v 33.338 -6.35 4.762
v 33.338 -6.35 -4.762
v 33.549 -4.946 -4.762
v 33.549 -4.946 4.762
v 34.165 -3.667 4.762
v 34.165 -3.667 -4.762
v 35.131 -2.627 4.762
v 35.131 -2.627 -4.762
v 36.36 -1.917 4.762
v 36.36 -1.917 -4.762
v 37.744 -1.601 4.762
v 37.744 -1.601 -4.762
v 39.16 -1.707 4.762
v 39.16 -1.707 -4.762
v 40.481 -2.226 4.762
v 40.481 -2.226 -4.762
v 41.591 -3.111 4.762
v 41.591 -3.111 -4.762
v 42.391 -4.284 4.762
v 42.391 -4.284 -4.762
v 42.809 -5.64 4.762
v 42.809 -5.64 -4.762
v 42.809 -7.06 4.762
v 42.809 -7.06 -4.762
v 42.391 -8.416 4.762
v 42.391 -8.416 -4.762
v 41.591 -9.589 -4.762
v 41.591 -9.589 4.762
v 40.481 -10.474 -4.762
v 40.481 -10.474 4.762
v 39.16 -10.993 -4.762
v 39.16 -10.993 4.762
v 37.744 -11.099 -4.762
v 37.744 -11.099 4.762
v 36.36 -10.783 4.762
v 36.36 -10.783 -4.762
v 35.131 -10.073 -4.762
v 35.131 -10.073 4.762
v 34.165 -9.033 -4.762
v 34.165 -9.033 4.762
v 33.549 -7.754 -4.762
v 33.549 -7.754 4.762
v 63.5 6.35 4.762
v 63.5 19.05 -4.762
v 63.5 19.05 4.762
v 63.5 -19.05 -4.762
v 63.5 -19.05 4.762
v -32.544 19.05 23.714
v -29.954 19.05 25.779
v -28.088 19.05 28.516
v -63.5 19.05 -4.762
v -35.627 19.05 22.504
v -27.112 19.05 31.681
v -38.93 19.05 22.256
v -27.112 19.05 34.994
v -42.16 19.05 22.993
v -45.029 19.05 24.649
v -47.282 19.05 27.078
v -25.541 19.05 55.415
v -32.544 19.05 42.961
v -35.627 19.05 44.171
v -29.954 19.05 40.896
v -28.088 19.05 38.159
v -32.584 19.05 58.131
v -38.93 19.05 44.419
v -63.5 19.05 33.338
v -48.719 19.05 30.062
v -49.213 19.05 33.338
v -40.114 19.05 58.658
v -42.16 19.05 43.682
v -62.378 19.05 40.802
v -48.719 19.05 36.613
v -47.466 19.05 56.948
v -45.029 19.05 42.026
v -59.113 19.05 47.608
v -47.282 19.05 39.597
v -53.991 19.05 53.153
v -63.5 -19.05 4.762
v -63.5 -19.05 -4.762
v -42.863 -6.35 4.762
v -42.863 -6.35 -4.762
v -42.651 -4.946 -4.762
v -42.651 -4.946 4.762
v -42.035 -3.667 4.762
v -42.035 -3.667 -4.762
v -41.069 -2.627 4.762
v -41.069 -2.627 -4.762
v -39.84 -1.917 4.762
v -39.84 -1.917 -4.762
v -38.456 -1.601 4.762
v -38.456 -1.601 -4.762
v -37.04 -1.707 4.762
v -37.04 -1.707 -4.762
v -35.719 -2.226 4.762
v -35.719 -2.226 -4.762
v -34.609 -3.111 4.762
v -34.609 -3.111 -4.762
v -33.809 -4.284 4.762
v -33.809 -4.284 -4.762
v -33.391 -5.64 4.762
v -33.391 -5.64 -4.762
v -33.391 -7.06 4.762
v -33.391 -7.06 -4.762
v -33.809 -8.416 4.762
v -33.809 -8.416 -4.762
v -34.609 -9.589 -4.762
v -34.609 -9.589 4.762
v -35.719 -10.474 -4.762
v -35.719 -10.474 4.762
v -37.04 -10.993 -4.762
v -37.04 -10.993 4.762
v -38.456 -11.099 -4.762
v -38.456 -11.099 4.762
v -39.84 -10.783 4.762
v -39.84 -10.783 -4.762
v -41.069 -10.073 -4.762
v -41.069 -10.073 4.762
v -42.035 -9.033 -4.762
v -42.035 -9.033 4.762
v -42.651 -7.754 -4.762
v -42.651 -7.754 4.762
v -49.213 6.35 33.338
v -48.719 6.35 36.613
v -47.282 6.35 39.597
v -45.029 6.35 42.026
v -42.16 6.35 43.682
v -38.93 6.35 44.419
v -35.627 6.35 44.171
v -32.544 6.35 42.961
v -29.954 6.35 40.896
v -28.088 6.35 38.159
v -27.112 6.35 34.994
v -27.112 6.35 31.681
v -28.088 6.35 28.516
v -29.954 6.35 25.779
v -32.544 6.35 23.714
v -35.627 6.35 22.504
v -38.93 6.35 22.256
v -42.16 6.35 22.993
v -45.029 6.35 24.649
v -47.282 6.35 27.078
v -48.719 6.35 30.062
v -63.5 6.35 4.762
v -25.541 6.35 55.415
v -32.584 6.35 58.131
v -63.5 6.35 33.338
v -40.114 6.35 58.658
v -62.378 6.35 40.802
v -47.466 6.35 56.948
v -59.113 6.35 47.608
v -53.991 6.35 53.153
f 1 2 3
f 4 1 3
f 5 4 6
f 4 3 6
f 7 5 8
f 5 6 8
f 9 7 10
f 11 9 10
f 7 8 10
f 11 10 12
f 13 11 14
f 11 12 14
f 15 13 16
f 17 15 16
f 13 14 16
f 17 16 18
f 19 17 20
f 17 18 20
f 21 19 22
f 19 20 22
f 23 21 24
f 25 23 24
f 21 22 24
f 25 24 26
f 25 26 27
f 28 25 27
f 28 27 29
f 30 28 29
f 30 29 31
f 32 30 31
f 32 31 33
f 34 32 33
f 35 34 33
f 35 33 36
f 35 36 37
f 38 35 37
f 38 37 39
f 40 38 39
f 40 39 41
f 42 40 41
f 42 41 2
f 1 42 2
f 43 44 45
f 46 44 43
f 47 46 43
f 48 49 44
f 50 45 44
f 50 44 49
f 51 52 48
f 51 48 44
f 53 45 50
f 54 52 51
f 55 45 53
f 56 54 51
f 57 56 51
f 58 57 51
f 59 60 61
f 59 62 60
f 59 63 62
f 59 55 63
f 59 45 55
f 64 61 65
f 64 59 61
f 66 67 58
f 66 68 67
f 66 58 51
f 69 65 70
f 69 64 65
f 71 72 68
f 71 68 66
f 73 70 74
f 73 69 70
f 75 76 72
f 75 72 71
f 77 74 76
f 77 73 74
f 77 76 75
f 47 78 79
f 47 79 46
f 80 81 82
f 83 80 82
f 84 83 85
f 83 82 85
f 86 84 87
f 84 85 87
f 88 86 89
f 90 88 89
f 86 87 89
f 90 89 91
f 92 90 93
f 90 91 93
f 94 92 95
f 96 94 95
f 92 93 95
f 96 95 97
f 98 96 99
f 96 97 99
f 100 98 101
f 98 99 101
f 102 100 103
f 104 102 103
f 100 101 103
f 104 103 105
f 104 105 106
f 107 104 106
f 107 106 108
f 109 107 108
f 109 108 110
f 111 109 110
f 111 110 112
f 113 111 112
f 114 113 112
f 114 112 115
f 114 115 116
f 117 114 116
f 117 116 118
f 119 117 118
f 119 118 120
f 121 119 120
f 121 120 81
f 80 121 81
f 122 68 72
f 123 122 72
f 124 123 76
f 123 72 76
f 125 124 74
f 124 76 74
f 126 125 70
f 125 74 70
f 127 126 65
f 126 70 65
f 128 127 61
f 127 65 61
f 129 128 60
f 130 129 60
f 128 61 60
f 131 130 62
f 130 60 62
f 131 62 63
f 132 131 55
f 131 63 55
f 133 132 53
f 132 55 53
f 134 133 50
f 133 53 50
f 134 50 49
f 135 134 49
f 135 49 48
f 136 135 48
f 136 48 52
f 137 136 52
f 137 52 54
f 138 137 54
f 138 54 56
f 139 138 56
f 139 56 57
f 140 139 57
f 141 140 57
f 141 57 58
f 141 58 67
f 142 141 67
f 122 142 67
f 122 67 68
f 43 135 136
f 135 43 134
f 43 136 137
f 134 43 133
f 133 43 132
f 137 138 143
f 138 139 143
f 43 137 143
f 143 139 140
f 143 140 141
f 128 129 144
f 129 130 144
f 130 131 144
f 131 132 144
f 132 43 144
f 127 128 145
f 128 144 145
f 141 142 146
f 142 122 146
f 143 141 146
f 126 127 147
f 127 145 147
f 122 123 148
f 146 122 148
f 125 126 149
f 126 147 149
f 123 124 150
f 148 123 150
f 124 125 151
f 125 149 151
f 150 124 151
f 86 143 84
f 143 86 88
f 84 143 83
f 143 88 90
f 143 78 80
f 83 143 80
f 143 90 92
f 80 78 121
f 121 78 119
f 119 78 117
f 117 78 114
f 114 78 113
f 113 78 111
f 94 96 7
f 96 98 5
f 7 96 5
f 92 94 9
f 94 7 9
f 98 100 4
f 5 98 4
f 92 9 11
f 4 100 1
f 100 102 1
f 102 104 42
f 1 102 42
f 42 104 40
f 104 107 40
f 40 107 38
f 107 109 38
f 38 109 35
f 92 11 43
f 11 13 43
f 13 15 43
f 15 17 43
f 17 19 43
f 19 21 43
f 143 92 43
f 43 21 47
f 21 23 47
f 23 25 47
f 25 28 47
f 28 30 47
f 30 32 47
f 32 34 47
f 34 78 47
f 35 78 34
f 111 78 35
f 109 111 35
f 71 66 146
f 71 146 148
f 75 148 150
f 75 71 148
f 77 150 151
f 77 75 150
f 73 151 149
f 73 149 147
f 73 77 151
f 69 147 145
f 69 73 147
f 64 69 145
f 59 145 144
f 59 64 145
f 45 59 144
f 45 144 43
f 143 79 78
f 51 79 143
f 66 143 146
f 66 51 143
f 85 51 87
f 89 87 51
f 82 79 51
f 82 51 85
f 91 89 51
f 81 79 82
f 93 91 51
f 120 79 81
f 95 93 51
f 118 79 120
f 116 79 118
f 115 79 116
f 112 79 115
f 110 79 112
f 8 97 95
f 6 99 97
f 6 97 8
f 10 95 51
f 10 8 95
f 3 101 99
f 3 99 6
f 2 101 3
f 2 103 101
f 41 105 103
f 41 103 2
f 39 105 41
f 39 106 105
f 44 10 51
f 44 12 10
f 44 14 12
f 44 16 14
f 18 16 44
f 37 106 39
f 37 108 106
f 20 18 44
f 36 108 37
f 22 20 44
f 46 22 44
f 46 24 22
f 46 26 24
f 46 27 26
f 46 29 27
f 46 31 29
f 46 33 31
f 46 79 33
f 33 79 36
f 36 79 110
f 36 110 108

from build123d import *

# Parameters (mm, degrees)
F0_W     = 127
F0_H     = 9.525
F1_DEPTH = 19.05
F3_DEPTH = 12.7
F5_D     = 22.225
F7_D     = 9.525


with BuildPart() as f1:
    # F0 (on Front) → F1 (new body, symmetric)
    with BuildSketch(Plane.XZ):
        Rectangle(F0_W, F0_H)
    extrude(amount=F1_DEPTH, both=True)

    # F2 (on face) → F3 (join)
    with BuildSketch(Plane(origin=(0, 19.05, 0), x_dir=(-1, 0, 0), z_dir=(0, 1, 0))):
        with BuildLine():
            Line((38.1, 4.7625), (63.5, 4.7625))
            Line((63.5, 4.7625), (63.5, 33.3375))
            ThreePointArc((63.5, 33.3375), (50.870136, 55.293903), (25.540659, 55.415157))
            Line((25.540659, 55.415157), (-63.5, 4.7625))
            Line((-63.5, 4.7625), (38.1, 4.7625))
        make_face()
    extrude(amount=-F3_DEPTH)

    # F5 (through all)
    with Locations(Plane.XZ.offset(-6.35)):
        with Locations((-38.1, 33.3375)):
            Hole(F5_D / 2)

    # F7 (through all)
    with Locations(Plane.XY.offset(4.7625)):
        with Locations((-38.1, -6.35), (38.1, -6.35)):
            Hole(F7_D / 2)


solid = f1.part
